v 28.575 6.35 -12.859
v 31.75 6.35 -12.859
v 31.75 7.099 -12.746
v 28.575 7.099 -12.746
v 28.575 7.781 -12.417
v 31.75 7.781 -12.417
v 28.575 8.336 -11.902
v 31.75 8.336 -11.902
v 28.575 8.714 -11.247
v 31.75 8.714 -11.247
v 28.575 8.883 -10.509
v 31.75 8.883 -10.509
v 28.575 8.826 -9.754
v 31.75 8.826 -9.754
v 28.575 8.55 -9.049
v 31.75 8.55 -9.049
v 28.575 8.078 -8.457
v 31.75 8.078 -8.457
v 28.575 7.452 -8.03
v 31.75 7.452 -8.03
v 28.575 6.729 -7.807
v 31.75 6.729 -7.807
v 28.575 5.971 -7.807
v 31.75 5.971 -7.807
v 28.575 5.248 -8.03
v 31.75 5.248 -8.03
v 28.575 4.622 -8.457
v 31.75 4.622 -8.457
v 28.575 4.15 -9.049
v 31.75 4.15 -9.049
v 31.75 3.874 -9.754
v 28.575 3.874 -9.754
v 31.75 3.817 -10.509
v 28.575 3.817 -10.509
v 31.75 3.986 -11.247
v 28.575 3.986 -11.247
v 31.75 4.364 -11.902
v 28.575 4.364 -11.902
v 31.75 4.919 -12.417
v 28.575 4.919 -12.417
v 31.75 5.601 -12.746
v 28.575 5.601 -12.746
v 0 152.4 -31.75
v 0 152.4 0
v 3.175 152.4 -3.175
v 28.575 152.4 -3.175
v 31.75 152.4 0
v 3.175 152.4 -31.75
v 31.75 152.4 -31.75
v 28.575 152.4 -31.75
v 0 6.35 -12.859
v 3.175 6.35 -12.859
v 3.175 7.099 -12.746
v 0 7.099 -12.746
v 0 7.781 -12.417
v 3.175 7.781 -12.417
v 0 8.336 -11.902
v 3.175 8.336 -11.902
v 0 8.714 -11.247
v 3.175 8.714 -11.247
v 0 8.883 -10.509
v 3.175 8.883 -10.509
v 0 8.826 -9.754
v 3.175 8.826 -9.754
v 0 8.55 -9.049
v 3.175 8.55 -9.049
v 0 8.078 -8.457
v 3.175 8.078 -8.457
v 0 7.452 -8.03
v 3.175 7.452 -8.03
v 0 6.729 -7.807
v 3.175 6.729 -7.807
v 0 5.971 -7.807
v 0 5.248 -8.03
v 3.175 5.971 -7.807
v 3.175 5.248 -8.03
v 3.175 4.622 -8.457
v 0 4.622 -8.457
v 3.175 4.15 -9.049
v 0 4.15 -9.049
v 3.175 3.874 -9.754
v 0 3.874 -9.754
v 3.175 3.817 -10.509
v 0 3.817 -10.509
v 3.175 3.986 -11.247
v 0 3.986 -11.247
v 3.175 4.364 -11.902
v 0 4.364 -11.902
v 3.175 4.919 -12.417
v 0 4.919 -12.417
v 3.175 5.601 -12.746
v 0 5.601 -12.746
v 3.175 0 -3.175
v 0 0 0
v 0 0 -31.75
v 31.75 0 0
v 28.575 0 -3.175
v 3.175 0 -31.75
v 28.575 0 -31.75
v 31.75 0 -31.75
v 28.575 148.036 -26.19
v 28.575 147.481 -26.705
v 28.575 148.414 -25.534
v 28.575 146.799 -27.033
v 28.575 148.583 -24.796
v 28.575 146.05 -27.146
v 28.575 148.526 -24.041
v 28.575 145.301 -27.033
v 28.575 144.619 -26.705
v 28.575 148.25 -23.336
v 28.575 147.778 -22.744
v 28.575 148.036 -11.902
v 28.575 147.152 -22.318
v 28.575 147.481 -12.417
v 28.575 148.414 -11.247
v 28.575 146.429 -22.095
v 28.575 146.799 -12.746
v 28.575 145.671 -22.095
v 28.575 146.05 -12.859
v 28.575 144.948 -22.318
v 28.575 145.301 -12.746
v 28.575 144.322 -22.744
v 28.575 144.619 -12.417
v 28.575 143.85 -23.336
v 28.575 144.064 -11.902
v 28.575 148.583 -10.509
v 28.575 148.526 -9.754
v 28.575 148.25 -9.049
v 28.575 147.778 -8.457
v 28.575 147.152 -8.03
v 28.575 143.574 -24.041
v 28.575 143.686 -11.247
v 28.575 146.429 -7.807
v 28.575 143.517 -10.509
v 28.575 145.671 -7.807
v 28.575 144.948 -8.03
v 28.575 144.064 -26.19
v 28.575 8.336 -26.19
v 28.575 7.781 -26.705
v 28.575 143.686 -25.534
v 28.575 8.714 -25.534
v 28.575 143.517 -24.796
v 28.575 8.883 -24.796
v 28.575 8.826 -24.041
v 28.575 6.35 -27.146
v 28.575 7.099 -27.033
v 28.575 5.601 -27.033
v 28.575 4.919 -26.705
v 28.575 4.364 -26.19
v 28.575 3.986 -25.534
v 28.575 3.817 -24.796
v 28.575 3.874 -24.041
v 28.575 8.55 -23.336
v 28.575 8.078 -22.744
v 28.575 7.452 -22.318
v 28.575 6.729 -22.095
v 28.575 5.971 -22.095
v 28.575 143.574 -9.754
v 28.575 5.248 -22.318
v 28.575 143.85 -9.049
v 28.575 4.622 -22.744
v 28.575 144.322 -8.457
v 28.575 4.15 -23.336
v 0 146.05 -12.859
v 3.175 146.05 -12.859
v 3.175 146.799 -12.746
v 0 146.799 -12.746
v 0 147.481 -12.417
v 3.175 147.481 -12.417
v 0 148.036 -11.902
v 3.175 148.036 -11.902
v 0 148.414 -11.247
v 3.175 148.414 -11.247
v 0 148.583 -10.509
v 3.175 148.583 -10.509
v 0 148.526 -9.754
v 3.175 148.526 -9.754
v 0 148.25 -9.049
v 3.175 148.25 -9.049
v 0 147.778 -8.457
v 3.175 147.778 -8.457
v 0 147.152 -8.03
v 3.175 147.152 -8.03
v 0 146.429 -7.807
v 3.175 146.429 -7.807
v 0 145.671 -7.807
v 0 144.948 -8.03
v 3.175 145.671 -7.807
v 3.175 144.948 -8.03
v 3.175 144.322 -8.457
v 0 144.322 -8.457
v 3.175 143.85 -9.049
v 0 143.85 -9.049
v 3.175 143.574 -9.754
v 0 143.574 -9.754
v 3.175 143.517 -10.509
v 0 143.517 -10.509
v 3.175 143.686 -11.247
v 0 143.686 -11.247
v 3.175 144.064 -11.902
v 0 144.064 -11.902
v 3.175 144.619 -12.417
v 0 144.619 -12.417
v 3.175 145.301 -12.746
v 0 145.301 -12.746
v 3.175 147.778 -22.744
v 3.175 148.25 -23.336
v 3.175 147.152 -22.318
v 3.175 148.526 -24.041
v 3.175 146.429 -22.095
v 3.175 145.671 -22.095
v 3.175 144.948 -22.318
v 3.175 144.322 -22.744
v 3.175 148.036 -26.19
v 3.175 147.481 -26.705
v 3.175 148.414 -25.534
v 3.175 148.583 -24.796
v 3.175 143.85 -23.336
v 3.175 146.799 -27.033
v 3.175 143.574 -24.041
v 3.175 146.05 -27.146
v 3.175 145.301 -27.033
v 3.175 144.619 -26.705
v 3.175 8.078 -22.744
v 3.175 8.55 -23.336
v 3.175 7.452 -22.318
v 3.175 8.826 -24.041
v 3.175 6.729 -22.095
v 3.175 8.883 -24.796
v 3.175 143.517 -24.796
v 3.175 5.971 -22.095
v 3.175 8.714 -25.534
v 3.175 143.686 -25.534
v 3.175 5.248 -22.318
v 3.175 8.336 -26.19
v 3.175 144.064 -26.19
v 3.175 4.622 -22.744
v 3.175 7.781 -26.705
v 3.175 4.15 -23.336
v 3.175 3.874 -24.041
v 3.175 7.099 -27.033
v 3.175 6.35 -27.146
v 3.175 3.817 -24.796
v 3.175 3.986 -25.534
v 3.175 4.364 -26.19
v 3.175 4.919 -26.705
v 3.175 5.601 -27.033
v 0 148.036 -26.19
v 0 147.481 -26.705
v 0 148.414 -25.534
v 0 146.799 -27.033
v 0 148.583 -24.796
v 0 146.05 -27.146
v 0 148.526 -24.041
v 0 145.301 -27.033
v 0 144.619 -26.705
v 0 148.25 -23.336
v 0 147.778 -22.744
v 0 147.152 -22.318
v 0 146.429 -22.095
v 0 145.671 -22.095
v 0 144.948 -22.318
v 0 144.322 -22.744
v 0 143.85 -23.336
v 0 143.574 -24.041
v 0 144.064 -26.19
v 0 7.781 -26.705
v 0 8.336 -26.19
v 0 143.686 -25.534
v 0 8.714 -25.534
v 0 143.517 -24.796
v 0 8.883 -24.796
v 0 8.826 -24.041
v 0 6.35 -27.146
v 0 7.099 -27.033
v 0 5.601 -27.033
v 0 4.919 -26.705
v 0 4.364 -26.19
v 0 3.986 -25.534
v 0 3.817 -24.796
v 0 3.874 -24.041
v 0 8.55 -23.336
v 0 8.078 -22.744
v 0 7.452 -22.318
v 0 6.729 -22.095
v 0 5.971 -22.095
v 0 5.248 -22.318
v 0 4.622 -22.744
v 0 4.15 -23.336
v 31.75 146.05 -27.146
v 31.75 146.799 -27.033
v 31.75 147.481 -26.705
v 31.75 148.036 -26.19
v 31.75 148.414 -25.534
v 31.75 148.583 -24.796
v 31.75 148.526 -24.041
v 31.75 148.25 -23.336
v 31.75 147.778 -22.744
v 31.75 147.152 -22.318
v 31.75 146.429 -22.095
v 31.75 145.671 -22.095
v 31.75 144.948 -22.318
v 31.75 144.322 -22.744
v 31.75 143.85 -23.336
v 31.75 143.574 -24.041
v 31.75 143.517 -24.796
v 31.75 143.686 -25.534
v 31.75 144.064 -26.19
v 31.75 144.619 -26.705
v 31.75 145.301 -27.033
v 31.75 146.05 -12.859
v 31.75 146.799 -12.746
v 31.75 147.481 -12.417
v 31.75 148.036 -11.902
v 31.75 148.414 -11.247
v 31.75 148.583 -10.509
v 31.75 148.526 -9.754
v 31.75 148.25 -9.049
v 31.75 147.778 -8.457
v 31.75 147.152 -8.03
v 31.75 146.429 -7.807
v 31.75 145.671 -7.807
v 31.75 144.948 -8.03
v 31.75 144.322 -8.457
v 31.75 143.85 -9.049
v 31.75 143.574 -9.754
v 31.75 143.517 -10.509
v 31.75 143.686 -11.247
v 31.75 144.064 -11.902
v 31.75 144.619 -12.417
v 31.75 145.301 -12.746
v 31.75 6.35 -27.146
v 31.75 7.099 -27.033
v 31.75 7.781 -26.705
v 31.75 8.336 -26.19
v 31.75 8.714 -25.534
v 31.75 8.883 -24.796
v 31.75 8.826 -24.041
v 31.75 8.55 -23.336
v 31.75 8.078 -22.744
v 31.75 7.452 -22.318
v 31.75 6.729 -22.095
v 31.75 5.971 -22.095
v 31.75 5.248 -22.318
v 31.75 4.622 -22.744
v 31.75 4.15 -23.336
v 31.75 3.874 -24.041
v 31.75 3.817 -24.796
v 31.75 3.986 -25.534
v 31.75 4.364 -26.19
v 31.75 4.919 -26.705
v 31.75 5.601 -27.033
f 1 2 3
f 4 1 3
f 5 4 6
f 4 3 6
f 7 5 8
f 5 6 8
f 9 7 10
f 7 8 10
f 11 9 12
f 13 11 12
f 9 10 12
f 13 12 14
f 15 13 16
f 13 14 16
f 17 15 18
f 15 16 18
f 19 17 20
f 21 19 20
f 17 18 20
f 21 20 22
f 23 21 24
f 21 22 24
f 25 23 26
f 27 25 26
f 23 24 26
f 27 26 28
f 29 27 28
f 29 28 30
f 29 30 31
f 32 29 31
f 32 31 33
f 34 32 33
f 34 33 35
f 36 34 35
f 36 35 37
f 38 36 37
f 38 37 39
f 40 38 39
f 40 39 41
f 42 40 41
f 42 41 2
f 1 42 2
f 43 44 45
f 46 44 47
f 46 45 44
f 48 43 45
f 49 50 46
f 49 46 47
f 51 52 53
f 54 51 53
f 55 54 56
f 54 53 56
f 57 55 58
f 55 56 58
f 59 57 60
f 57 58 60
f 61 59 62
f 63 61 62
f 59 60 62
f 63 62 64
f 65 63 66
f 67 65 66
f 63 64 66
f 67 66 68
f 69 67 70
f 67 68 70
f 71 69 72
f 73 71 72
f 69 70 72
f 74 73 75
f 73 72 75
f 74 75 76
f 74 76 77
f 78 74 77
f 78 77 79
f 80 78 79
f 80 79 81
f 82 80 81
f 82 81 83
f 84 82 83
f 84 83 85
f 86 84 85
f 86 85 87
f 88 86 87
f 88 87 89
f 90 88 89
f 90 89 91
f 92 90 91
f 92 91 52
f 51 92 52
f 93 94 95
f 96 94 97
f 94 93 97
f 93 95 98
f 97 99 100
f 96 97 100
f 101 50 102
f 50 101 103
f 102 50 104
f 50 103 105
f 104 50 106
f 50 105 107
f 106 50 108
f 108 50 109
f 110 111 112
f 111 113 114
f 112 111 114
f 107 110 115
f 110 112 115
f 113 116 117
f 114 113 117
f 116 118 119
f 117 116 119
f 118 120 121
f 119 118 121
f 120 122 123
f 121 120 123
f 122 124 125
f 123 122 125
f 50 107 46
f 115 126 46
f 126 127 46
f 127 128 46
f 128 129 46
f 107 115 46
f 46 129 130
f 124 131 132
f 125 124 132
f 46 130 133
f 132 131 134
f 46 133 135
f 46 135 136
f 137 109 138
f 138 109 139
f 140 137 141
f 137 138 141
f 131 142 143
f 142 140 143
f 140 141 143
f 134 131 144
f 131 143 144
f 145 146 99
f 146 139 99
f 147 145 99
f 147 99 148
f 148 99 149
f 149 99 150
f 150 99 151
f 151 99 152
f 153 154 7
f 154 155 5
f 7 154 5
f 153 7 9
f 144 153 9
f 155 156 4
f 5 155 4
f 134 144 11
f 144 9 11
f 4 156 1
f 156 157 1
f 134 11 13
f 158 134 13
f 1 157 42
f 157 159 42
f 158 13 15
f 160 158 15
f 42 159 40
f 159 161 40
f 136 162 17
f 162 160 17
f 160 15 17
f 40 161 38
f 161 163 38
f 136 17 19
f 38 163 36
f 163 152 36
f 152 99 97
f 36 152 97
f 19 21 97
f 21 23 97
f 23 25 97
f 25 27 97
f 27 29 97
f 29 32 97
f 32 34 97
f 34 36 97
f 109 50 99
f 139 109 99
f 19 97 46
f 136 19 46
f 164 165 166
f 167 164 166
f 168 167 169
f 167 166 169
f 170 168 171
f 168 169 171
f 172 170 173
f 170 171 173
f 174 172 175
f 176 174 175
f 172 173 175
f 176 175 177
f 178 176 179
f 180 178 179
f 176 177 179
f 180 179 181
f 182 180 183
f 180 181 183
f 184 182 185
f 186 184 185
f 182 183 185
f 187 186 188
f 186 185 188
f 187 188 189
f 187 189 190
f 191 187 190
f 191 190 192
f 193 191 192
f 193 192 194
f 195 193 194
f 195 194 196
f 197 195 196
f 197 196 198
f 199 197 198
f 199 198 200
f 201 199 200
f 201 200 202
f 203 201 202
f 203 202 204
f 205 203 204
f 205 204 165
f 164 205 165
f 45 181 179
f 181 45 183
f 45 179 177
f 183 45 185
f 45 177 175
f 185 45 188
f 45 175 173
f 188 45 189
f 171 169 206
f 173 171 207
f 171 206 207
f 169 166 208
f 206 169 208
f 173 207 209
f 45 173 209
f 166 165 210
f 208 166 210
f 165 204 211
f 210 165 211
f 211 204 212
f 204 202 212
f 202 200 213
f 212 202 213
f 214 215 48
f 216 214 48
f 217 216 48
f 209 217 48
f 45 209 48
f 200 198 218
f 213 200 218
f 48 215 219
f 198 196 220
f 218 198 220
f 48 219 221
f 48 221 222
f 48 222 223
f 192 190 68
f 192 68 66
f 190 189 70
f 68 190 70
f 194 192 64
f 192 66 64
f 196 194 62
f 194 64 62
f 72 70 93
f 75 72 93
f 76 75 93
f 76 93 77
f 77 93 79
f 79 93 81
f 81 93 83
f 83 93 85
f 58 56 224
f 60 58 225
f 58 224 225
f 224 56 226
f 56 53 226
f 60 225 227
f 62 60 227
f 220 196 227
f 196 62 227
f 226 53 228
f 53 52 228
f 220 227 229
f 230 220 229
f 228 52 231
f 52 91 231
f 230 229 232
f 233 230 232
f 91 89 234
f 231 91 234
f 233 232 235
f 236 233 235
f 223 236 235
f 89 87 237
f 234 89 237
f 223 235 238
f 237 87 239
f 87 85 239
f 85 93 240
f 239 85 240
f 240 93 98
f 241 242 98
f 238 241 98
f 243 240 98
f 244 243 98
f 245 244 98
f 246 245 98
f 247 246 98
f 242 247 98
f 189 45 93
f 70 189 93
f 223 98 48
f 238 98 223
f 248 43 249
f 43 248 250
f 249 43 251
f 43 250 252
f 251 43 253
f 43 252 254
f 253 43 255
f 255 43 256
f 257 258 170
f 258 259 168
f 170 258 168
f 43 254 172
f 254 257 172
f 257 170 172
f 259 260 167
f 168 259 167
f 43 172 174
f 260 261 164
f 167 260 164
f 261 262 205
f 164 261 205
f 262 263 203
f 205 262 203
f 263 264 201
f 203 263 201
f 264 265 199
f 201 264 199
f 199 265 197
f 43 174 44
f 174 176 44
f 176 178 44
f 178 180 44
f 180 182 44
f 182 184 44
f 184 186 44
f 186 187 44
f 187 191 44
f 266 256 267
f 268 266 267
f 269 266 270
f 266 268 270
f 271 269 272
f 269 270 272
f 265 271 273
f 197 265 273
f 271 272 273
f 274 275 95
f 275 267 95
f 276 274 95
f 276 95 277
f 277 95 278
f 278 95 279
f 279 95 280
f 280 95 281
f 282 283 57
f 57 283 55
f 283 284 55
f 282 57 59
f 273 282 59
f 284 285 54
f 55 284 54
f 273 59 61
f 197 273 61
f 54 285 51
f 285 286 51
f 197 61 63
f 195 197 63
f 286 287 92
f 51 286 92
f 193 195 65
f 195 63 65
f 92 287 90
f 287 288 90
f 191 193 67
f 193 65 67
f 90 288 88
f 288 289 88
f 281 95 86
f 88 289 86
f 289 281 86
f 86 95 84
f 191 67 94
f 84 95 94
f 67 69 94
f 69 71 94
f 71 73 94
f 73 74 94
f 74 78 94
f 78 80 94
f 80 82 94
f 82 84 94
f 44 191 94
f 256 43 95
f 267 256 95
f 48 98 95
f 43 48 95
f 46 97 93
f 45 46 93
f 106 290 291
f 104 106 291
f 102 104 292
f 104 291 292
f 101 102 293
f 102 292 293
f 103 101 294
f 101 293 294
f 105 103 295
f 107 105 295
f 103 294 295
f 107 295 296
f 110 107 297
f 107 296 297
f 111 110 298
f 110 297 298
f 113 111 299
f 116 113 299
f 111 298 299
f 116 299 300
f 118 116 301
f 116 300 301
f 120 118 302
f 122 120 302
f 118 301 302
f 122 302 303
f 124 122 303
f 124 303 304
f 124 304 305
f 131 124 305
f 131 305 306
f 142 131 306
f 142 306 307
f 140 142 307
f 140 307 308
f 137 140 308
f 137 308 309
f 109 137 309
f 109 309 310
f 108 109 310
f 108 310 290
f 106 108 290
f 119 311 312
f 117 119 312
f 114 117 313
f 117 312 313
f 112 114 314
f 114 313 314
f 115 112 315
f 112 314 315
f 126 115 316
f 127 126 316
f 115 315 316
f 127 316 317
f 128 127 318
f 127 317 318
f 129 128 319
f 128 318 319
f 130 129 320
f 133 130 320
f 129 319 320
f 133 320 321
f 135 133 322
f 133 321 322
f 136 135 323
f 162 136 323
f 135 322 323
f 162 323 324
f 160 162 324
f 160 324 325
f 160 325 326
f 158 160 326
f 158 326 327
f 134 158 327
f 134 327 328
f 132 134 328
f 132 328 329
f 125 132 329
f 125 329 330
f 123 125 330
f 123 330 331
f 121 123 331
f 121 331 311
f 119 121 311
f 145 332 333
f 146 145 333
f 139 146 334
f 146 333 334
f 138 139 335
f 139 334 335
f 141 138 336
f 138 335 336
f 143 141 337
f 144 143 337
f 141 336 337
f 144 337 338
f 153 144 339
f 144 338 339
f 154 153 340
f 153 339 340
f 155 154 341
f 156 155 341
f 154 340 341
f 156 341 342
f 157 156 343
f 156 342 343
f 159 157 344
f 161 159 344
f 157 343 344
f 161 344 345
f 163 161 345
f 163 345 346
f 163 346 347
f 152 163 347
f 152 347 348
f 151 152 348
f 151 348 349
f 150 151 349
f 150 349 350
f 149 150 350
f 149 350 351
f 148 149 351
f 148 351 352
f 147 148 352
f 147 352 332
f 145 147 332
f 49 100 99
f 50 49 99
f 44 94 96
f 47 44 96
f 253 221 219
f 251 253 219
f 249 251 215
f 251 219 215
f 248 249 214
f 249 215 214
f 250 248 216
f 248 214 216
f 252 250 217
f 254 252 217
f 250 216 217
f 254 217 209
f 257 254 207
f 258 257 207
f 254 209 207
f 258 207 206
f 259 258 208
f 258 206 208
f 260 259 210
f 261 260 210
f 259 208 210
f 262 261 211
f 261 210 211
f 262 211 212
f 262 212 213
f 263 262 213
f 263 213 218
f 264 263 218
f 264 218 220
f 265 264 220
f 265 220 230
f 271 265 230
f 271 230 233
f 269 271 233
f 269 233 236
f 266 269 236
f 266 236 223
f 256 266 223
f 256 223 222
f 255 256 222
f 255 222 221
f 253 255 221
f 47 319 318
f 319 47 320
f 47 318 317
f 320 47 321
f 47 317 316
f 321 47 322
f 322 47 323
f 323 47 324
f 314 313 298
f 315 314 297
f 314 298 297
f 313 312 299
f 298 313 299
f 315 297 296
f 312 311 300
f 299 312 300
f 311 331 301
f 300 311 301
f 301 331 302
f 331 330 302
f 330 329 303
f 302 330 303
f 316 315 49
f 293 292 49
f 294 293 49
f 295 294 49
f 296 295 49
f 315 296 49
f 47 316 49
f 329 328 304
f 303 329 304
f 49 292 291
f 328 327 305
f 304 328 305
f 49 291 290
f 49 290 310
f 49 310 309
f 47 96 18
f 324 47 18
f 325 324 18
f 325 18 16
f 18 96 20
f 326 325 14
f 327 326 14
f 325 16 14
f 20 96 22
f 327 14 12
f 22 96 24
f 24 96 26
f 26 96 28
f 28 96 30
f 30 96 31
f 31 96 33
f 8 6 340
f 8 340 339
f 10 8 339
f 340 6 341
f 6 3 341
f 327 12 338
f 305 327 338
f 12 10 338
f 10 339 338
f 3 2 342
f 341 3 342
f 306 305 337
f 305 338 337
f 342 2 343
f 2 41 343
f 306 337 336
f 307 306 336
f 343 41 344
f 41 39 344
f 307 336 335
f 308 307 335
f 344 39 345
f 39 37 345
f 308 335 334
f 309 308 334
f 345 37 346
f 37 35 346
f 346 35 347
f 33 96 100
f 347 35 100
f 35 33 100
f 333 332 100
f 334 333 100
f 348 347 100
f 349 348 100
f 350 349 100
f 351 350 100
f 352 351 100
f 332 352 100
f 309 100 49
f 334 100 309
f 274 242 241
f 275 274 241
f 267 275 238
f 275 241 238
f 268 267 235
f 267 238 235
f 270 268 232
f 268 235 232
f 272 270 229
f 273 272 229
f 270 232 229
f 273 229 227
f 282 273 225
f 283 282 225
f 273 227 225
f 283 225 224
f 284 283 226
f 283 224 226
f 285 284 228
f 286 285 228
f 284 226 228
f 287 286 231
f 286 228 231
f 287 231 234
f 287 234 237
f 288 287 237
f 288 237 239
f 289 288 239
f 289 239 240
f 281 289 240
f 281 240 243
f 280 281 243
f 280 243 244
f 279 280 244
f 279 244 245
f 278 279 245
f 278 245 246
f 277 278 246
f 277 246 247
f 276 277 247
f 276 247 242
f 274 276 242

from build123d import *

# Parameters (mm, degrees)
BOSS_EXTRUDE1_DEPTH = 152.4
SKETCH2_R           = 2.54
CUT_EXTRUDE2_DEPTH  = 31.75


with BuildPart() as part:
    # Sketch1 → Boss-Extrude1 (new body)
    with BuildSketch(Plane(origin=(0, 0, 0), x_dir=(1, 0, 0), z_dir=(0, 1, 0))):
        Polygon((0, 0), (31.75, 0), (31.75, 31.75), (28.575, 31.75), (28.575, 3.175), (3.175, 3.175), (3.175, 31.75), (0, 31.75), align=None)
    extrude(amount=BOSS_EXTRUDE1_DEPTH)

    # Sketch2 → Cut-Extrude2 (cut)
    with BuildSketch(Plane(origin=(31.75, 0, 0), x_dir=(0, 0, -1), z_dir=(1, 0, 0))):
        with Locations((24.60625, 6.35)):
            Circle(SKETCH2_R)
        with Locations((10.31875, 6.35)):
            Circle(SKETCH2_R)
        with Locations((24.60625, 146.05)):
            Circle(SKETCH2_R)
        with Locations((10.31875, 146.05)):
            Circle(SKETCH2_R)
    extrude(amount=-CUT_EXTRUDE2_DEPTH, mode=Mode.SUBTRACT)


solid = part.part
